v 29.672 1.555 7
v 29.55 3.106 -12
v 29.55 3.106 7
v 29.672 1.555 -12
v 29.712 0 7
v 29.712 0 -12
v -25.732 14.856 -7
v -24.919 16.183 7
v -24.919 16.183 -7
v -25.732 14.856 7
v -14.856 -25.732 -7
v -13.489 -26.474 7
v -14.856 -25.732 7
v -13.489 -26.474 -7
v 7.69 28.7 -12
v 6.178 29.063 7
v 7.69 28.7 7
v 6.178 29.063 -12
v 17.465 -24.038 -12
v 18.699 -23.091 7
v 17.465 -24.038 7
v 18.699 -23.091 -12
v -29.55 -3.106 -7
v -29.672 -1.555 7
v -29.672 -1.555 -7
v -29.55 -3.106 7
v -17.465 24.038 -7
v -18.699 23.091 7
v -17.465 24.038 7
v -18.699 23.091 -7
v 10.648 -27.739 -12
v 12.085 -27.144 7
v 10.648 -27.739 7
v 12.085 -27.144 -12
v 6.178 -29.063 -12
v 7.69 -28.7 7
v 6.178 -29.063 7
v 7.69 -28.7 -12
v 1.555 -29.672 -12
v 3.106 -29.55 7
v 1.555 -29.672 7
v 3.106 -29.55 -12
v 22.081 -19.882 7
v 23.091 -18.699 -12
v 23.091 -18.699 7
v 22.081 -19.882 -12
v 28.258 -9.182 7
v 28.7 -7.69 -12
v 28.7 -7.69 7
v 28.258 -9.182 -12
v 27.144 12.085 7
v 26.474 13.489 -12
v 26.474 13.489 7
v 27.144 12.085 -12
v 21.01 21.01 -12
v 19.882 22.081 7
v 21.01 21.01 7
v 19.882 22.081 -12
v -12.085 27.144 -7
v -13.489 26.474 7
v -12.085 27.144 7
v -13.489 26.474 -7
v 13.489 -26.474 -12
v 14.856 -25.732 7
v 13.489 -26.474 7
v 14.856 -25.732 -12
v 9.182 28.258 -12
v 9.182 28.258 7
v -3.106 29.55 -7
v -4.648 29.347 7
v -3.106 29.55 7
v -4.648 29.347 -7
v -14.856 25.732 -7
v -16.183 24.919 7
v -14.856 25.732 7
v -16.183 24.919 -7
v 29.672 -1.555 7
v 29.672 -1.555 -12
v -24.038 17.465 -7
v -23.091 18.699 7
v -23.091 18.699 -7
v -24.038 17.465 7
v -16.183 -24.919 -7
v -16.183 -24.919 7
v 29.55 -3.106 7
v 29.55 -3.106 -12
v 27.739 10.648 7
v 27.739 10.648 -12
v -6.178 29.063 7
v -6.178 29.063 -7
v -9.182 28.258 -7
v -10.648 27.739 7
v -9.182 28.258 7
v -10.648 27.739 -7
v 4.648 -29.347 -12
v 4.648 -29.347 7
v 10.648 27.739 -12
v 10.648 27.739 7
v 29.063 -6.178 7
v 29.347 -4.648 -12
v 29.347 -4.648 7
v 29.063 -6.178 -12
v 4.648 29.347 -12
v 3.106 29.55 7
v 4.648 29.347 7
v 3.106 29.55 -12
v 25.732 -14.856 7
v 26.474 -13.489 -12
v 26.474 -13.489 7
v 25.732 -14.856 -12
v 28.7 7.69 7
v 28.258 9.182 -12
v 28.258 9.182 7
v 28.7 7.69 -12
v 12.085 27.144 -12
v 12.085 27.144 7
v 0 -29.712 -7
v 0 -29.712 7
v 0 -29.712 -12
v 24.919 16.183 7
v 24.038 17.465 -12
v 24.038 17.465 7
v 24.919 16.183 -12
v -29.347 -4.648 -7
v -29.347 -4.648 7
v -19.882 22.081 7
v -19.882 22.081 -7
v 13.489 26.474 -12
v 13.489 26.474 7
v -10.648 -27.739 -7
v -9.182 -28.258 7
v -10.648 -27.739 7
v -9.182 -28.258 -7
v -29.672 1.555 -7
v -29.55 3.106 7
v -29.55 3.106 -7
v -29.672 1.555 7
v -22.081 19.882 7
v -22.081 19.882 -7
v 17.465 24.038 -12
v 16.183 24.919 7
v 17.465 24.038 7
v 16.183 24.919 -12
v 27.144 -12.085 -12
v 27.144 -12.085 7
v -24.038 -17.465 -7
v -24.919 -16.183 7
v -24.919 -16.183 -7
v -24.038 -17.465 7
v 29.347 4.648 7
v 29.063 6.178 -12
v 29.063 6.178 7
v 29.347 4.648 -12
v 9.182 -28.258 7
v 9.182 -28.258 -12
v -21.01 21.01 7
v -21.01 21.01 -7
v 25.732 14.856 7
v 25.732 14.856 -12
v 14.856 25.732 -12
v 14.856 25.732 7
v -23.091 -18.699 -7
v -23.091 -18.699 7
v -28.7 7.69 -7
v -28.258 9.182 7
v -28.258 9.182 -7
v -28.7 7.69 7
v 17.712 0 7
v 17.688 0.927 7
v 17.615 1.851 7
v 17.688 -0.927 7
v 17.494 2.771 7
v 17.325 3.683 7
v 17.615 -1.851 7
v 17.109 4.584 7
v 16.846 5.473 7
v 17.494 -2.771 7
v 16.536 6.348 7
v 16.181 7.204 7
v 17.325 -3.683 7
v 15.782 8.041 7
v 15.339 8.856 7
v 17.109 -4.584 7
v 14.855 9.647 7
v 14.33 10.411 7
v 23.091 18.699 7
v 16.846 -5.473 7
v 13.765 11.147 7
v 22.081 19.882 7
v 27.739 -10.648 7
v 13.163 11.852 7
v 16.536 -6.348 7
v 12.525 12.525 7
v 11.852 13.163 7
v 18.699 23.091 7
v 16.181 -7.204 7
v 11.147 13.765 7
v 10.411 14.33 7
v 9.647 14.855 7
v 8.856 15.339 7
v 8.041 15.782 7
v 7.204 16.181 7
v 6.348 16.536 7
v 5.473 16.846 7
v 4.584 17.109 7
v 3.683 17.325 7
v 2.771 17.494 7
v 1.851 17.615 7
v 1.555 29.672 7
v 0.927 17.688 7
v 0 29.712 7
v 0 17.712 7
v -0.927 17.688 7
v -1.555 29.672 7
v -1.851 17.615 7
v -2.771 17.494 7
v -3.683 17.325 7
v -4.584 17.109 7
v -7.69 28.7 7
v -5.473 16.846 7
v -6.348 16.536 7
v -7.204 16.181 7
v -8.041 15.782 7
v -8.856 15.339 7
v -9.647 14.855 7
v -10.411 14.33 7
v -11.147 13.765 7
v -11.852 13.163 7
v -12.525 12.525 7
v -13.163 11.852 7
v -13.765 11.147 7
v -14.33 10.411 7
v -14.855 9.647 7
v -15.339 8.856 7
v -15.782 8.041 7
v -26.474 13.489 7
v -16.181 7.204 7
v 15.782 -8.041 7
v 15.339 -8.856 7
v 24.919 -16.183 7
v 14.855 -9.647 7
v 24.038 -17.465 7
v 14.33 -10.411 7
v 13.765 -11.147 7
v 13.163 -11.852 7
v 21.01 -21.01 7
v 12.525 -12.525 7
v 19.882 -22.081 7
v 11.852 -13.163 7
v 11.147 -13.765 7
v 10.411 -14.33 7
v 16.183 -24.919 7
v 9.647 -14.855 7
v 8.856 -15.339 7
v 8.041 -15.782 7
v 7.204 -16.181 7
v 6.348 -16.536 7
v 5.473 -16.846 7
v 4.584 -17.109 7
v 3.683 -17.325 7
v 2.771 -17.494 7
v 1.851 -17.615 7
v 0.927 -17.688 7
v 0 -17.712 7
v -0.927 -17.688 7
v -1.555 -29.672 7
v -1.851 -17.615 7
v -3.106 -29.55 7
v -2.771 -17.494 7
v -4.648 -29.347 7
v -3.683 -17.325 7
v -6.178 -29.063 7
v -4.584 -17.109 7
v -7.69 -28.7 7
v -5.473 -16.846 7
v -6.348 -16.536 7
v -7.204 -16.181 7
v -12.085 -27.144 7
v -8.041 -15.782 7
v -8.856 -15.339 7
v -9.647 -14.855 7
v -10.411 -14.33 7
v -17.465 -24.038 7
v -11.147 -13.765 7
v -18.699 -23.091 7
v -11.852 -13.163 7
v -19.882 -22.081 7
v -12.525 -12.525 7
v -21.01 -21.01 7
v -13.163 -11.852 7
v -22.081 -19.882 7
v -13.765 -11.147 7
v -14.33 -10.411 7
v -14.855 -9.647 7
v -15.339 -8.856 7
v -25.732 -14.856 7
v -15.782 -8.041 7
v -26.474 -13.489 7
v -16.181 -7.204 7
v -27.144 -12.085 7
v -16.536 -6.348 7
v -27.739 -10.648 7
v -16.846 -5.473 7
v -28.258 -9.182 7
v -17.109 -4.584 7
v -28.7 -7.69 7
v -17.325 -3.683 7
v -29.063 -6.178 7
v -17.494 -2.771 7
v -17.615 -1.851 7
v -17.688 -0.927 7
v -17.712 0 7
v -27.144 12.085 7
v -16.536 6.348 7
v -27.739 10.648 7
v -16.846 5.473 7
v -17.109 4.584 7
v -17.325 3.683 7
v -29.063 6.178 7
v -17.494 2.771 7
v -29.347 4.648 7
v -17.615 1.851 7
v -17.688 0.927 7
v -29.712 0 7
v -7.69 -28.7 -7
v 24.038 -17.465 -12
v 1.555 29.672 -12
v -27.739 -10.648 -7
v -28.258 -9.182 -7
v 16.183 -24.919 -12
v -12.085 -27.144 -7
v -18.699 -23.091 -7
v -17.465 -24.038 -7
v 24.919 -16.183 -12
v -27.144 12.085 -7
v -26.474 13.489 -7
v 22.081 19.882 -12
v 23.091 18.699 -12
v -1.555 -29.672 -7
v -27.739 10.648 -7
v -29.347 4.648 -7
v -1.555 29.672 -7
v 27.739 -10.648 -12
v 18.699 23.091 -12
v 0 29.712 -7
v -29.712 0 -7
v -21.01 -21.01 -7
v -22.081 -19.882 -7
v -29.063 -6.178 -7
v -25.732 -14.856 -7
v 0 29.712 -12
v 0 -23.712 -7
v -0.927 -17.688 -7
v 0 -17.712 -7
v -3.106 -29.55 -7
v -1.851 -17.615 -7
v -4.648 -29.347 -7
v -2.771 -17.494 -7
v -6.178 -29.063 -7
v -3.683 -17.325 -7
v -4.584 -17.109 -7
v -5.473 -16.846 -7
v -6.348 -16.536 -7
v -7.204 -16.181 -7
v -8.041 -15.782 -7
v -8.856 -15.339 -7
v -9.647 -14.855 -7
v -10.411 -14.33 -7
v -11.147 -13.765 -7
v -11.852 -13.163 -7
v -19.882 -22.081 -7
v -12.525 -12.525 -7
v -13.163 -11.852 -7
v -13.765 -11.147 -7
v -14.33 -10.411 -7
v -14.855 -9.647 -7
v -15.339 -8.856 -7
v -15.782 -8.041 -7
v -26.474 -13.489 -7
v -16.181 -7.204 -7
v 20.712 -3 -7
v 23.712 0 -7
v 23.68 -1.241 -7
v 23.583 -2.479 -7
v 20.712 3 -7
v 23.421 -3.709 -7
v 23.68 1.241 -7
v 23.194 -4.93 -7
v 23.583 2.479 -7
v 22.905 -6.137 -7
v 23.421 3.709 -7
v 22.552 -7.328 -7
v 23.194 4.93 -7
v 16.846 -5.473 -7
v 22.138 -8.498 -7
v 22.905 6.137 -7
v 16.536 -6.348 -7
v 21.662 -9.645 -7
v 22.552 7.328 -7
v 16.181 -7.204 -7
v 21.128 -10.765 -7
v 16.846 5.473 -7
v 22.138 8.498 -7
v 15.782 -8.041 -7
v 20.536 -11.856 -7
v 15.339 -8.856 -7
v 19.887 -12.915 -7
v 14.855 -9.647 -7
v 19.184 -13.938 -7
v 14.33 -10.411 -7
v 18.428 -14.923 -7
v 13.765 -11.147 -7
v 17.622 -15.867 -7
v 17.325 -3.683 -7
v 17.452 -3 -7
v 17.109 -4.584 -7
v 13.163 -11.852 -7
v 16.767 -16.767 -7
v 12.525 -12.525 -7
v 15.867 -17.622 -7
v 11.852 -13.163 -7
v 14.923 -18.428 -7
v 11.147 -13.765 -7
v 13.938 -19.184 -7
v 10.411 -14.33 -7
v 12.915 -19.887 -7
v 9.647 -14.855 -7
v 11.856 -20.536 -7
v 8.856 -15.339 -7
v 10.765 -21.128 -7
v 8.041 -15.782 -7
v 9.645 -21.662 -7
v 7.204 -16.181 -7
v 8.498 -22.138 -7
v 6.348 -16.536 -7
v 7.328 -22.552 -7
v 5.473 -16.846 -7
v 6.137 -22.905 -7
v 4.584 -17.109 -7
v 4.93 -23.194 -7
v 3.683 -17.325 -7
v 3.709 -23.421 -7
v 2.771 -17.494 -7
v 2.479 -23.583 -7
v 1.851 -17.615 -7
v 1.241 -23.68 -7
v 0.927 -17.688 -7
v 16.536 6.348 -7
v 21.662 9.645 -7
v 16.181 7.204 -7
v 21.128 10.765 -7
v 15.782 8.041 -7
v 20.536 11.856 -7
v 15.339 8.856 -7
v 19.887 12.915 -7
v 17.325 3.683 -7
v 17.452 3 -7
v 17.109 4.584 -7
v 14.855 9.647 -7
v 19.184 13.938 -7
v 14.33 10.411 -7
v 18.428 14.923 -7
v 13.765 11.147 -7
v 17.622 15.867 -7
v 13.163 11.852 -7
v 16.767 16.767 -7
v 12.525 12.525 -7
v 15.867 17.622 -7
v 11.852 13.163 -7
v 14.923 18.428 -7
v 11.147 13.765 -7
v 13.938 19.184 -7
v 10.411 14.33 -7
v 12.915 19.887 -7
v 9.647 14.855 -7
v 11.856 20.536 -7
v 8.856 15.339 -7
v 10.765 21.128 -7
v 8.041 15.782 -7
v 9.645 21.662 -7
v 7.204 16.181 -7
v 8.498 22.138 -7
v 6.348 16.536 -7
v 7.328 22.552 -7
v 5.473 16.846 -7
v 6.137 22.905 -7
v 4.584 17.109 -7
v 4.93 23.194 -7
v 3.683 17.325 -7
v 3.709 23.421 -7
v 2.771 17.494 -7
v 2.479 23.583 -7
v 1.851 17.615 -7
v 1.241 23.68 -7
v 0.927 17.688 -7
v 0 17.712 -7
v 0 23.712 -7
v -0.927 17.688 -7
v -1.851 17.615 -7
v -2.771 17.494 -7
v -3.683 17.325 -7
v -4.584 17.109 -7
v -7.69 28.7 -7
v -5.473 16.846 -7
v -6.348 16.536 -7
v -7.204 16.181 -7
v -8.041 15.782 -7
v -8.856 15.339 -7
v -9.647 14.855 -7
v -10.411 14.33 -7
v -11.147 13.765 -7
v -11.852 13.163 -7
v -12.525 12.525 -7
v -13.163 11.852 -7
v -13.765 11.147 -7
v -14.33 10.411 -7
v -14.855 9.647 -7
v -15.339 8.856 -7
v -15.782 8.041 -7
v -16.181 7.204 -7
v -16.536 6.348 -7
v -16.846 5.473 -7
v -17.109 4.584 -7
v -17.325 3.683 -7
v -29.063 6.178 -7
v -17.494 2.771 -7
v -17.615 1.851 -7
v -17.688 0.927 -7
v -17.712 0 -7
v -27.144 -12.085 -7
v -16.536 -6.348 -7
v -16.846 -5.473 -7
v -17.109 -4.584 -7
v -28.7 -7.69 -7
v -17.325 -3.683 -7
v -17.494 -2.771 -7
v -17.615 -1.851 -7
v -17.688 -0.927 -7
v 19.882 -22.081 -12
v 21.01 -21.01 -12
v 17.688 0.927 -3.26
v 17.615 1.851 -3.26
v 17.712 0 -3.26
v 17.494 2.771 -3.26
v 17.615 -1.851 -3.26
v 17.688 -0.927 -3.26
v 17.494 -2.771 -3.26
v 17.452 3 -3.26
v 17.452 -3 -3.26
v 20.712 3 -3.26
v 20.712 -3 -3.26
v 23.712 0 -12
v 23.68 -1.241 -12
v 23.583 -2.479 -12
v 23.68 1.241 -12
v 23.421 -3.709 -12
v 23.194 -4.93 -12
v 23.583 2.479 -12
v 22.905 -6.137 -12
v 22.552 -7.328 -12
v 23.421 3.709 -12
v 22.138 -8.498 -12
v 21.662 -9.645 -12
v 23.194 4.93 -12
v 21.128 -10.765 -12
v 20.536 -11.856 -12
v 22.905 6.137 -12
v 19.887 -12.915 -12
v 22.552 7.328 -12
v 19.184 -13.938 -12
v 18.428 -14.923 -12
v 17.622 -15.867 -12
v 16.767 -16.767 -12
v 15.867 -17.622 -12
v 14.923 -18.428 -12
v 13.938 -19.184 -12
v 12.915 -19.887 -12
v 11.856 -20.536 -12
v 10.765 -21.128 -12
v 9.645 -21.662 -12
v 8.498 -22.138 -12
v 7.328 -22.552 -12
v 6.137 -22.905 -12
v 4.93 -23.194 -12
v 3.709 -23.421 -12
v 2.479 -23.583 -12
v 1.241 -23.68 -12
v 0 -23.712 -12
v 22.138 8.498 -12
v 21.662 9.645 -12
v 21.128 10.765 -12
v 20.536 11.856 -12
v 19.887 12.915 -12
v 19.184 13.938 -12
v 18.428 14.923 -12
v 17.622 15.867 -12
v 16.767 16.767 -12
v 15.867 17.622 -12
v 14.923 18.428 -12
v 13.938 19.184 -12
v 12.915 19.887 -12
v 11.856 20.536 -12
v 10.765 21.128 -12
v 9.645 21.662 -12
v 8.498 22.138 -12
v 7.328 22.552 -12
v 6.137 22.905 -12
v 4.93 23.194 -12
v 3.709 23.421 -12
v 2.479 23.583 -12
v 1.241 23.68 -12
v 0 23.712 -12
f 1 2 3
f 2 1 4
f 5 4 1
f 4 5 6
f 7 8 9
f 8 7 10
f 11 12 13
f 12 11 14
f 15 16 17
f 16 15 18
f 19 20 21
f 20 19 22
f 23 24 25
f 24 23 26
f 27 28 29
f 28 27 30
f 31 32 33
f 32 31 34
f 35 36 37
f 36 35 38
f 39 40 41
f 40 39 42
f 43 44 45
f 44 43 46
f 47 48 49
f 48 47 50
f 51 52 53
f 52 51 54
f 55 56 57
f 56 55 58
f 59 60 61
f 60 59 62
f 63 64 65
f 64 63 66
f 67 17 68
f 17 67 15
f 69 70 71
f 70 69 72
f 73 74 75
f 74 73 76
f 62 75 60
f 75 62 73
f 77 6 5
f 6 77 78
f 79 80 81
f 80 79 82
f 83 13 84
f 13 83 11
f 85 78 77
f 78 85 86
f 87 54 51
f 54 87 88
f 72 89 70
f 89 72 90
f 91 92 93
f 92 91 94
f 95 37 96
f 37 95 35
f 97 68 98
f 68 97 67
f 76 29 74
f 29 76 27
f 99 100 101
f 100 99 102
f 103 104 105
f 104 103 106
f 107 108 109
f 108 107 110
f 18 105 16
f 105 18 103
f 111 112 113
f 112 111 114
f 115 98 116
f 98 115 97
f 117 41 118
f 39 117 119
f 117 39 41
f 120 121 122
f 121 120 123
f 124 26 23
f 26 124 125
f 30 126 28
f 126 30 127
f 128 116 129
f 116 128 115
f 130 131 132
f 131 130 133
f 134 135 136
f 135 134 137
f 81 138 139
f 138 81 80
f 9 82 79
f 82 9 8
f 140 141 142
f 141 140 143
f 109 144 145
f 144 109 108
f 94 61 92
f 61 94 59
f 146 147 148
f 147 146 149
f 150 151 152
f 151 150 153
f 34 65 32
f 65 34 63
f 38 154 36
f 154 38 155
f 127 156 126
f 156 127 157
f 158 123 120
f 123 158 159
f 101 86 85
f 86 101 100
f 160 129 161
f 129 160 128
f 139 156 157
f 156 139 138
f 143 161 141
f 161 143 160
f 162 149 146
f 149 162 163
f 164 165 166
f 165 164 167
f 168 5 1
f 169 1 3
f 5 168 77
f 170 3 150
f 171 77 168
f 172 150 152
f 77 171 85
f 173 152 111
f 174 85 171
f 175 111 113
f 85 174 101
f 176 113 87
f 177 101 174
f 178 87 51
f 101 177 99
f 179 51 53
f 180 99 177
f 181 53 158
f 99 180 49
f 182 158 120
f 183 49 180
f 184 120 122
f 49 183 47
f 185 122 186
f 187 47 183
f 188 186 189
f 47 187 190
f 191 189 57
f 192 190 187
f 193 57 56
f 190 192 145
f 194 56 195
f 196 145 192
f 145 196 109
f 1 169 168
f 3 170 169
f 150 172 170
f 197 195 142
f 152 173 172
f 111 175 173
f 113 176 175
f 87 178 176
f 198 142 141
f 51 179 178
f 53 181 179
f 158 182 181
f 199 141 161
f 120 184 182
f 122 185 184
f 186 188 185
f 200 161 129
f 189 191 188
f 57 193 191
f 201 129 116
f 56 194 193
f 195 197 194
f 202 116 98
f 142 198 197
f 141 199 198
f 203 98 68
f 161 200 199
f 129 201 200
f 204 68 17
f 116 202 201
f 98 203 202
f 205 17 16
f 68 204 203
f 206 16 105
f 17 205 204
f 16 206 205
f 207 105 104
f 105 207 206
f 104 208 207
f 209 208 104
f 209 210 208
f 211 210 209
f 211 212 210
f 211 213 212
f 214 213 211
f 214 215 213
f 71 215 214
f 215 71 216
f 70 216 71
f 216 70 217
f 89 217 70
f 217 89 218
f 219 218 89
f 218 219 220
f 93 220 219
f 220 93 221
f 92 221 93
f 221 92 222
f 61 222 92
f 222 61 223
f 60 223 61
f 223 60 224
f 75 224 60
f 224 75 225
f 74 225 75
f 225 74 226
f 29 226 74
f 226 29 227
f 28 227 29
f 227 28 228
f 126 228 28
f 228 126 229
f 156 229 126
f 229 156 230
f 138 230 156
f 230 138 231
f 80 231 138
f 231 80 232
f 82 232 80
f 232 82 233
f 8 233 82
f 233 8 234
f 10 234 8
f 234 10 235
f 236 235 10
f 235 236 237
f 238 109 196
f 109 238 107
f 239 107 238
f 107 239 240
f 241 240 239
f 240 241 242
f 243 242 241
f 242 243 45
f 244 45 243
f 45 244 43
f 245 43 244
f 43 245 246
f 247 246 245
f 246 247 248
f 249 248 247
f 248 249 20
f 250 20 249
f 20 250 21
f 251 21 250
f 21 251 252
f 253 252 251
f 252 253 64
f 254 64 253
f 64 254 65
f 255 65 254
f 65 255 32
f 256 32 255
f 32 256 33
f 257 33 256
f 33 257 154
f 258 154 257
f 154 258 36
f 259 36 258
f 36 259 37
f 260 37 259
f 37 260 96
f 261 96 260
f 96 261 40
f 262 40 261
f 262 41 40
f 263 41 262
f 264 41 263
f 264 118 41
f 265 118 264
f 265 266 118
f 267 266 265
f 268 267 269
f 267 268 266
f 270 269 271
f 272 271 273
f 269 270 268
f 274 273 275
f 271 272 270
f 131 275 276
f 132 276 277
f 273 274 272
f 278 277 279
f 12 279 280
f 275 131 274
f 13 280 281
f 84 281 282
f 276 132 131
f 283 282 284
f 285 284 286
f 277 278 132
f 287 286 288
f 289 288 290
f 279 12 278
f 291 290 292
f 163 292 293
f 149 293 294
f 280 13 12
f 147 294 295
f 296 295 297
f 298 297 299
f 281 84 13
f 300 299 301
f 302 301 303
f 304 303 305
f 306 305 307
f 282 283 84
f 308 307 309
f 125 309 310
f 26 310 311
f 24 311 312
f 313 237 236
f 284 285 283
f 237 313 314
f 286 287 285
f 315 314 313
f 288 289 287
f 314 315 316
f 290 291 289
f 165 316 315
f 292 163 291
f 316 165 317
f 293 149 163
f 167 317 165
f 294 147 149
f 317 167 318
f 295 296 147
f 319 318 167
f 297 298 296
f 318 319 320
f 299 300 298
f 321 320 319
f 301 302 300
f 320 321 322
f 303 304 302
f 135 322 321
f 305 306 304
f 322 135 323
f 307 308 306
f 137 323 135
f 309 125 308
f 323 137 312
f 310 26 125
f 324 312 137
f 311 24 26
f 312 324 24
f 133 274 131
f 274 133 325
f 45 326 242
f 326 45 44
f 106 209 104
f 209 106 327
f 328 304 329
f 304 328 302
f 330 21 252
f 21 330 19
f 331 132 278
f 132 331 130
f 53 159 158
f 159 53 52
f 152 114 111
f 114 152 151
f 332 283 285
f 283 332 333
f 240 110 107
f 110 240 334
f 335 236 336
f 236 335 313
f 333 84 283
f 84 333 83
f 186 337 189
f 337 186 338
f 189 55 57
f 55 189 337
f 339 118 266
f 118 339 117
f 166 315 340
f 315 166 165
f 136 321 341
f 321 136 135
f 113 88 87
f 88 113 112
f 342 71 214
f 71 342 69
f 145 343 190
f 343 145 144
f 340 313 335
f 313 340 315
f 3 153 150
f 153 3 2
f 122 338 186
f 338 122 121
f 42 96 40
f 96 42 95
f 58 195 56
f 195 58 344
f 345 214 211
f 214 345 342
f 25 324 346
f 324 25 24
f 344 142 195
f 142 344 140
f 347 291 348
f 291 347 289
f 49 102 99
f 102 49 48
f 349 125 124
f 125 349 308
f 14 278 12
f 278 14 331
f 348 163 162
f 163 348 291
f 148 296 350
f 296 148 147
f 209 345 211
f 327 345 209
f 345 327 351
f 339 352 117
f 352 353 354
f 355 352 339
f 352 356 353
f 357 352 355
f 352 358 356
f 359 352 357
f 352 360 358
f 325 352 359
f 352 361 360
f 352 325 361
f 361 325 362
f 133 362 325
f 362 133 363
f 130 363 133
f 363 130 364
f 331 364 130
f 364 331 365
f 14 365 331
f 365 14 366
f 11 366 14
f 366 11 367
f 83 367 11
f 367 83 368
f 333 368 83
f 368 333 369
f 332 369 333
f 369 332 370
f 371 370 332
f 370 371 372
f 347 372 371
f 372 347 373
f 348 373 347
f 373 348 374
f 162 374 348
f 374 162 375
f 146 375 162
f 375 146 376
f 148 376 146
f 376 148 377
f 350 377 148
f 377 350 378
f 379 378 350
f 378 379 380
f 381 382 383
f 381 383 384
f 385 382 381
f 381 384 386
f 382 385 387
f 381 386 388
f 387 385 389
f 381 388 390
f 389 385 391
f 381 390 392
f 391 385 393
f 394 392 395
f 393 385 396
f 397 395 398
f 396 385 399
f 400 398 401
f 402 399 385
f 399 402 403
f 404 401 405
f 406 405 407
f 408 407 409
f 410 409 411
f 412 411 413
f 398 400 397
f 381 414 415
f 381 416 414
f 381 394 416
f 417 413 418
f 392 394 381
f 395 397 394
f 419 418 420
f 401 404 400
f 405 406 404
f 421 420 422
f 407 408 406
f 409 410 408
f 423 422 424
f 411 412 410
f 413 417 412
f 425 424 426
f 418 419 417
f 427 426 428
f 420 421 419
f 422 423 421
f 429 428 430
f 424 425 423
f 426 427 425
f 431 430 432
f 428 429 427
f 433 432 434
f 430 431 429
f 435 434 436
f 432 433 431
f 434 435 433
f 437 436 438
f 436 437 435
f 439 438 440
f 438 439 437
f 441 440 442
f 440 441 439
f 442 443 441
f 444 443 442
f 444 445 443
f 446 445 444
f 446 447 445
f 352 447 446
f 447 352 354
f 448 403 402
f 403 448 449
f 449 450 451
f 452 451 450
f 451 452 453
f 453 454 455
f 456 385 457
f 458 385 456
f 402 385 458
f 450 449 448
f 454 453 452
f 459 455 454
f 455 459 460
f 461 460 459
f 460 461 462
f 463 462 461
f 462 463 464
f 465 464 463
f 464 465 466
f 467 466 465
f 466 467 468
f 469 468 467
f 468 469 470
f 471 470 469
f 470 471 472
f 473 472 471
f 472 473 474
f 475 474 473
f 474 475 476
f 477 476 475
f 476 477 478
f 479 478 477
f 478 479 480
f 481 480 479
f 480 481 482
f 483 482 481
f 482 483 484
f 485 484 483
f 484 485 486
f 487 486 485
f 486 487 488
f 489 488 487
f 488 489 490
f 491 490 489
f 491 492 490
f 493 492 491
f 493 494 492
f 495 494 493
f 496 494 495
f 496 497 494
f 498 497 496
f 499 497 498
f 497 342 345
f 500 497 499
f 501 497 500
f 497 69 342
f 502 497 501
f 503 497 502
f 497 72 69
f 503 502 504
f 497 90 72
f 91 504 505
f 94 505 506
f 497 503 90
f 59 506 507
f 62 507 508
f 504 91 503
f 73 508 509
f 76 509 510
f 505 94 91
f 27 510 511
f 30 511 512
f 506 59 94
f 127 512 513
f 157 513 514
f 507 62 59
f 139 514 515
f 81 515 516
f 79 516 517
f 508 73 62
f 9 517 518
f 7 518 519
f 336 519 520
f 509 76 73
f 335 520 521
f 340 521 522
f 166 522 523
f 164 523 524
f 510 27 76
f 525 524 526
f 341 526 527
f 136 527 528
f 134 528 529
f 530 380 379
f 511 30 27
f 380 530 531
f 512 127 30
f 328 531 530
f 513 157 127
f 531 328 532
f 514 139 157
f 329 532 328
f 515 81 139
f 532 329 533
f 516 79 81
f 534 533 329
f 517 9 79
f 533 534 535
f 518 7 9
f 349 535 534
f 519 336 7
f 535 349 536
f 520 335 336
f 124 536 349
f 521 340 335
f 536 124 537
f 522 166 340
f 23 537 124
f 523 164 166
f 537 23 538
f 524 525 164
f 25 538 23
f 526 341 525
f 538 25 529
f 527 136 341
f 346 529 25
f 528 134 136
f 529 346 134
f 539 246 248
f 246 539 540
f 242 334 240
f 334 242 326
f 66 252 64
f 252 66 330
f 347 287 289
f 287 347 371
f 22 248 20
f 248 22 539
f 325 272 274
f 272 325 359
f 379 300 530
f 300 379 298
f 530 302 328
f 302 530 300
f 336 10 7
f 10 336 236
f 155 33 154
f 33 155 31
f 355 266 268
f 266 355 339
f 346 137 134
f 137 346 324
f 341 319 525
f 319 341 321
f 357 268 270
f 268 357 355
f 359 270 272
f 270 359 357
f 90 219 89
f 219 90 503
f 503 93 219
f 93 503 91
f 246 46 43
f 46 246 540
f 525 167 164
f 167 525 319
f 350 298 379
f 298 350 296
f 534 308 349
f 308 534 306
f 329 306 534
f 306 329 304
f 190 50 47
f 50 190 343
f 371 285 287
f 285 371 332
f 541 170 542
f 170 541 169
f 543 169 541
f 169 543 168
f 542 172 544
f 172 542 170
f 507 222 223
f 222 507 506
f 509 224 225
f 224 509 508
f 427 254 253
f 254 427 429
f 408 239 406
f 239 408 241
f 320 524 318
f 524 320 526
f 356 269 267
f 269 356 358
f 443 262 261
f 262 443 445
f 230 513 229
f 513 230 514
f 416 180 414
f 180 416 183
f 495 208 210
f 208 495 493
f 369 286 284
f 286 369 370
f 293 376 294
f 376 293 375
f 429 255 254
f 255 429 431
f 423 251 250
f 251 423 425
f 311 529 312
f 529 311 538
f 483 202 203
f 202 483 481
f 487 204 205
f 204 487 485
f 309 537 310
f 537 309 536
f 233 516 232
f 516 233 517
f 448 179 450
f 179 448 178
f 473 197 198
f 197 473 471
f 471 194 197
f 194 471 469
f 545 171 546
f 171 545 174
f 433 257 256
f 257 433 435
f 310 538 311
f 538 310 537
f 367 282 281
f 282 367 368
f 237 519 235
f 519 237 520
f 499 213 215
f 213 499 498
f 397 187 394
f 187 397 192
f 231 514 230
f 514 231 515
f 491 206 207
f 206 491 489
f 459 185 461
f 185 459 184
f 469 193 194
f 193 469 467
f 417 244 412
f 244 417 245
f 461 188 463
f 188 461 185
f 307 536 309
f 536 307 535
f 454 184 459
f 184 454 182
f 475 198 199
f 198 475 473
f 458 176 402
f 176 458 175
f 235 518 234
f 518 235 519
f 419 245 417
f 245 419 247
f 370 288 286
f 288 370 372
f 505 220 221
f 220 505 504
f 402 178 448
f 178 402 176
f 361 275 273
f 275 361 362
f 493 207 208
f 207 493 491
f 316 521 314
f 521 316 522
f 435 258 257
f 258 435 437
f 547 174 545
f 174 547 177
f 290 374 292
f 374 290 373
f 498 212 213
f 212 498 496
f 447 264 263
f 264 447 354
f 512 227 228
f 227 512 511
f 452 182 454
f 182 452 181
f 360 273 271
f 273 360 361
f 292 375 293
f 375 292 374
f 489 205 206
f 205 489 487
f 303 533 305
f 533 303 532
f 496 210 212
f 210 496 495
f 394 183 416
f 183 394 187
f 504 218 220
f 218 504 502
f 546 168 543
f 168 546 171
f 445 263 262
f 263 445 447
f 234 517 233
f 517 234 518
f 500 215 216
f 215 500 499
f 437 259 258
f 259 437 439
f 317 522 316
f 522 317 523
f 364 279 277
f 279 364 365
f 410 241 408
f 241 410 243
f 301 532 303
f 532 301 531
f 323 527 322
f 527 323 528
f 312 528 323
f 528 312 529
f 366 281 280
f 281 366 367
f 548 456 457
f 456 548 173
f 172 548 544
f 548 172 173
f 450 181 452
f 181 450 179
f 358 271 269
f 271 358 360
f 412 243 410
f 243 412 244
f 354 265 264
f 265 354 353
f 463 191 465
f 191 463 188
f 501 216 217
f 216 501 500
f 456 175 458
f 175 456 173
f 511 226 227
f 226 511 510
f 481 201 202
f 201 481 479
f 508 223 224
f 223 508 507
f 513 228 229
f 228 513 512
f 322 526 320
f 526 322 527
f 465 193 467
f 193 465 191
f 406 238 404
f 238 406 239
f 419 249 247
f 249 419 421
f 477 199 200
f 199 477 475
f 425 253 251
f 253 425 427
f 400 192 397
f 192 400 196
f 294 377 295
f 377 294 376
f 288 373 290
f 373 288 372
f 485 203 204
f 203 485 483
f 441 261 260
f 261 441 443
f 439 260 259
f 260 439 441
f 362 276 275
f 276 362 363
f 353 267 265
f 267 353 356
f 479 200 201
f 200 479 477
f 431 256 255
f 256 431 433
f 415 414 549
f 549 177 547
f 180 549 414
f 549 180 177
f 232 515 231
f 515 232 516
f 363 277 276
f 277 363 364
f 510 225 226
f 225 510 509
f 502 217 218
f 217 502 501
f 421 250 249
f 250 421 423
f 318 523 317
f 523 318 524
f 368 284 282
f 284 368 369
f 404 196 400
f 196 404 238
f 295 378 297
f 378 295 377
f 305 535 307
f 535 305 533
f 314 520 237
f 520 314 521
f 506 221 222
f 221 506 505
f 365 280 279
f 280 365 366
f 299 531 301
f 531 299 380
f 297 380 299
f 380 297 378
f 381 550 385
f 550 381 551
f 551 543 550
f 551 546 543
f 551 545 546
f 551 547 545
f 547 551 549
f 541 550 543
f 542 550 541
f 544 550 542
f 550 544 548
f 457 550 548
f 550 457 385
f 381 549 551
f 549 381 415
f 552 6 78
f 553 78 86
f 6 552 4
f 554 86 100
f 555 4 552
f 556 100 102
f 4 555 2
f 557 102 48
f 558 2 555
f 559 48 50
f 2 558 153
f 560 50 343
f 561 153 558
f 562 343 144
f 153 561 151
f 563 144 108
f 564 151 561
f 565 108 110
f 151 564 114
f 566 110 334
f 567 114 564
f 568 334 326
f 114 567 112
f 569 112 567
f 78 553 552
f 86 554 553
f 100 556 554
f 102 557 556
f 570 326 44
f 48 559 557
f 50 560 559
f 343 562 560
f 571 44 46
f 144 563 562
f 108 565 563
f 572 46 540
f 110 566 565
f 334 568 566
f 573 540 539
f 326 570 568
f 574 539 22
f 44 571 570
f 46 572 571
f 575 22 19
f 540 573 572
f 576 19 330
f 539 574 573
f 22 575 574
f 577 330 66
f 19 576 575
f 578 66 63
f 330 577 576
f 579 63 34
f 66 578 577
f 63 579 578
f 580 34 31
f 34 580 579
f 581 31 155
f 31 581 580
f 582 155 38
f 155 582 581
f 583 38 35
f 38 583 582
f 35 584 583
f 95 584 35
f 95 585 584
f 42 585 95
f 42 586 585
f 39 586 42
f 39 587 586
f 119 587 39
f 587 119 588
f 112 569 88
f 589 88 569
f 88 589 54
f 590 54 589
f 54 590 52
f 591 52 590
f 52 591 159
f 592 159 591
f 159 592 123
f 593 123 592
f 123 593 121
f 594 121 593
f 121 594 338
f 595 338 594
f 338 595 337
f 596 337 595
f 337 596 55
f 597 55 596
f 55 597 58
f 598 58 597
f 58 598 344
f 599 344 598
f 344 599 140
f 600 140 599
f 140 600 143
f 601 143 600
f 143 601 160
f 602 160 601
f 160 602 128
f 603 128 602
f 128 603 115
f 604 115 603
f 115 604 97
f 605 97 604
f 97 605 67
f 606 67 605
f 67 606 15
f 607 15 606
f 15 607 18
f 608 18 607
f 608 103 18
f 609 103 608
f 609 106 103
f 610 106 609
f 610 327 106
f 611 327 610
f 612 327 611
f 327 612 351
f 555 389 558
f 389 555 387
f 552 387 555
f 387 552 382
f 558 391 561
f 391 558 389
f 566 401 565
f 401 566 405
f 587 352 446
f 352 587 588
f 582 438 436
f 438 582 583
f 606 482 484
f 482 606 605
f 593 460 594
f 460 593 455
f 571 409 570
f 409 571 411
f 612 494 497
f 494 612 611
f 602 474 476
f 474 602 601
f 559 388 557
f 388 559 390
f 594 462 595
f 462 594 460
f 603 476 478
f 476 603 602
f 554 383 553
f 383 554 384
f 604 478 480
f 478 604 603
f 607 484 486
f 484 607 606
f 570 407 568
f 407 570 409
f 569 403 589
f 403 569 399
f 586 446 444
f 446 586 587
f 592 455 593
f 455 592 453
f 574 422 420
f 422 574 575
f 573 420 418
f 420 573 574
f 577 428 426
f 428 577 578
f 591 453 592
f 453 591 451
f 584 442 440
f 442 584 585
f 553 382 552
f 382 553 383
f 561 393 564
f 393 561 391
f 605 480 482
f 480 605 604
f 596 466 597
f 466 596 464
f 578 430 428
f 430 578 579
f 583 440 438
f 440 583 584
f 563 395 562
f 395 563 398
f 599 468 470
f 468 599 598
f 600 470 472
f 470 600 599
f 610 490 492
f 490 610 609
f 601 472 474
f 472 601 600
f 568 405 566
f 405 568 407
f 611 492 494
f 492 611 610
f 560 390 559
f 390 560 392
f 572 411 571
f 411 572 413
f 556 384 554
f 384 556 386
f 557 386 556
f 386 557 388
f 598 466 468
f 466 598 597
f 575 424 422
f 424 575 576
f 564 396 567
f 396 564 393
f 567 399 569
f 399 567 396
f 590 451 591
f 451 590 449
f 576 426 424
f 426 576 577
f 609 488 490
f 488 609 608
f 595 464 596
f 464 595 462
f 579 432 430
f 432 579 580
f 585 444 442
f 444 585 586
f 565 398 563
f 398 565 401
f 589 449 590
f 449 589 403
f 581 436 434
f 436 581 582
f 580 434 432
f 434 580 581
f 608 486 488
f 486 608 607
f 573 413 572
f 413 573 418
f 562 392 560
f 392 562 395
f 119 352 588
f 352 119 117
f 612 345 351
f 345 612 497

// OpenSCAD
/*
Code in this file is the intellectual property of Brian McEvoy
http://www.24hourengineer.com/
*/

dowelDiameter = (1 + 3/8) * 25.4;
dowelSlop = 0.5;
collarThickness = 12;
collarWidth = 14;
zipTieVoid = 6;
centerDividerDepth = 5;

dowelRadius = dowelDiameter/2 + dowelSlop/2;
outerRadius = dowelRadius + collarThickness;
echo("Dowel Diameter in millimeters: ", dowelRadius*2);

$fn = 120;

collarBit = 1;
centerDrawBit = 1;

if(collarBit){
    difference(){
        cylinder(collarWidth, outerRadius, outerRadius, center = true);
        cylinder(collarWidth*2, dowelRadius, dowelRadius, center = true);
        translate([zipTieVoid/2,0,-collarWidth/2 + zipTieVoid/8 - 0.01]){
            cube([dowelRadius*2 + 0, zipTieVoid, zipTieVoid], center = true);
        }
    }
}


if(centerDrawBit){
    difference(){
        translate([0,0,-centerDividerDepth]){
            cylinder(collarWidth, outerRadius, outerRadius, center = true);
        }
        centerDividerThickness = (dowelRadius + outerRadius)/2;
        cylinder(collarWidth*2, centerDividerThickness, centerDividerThickness, center = true);
        translate([-outerRadius*1,0,0]){
            cube([outerRadius*2, outerRadius*2, outerRadius*2], center = true);
        }
    }
}
